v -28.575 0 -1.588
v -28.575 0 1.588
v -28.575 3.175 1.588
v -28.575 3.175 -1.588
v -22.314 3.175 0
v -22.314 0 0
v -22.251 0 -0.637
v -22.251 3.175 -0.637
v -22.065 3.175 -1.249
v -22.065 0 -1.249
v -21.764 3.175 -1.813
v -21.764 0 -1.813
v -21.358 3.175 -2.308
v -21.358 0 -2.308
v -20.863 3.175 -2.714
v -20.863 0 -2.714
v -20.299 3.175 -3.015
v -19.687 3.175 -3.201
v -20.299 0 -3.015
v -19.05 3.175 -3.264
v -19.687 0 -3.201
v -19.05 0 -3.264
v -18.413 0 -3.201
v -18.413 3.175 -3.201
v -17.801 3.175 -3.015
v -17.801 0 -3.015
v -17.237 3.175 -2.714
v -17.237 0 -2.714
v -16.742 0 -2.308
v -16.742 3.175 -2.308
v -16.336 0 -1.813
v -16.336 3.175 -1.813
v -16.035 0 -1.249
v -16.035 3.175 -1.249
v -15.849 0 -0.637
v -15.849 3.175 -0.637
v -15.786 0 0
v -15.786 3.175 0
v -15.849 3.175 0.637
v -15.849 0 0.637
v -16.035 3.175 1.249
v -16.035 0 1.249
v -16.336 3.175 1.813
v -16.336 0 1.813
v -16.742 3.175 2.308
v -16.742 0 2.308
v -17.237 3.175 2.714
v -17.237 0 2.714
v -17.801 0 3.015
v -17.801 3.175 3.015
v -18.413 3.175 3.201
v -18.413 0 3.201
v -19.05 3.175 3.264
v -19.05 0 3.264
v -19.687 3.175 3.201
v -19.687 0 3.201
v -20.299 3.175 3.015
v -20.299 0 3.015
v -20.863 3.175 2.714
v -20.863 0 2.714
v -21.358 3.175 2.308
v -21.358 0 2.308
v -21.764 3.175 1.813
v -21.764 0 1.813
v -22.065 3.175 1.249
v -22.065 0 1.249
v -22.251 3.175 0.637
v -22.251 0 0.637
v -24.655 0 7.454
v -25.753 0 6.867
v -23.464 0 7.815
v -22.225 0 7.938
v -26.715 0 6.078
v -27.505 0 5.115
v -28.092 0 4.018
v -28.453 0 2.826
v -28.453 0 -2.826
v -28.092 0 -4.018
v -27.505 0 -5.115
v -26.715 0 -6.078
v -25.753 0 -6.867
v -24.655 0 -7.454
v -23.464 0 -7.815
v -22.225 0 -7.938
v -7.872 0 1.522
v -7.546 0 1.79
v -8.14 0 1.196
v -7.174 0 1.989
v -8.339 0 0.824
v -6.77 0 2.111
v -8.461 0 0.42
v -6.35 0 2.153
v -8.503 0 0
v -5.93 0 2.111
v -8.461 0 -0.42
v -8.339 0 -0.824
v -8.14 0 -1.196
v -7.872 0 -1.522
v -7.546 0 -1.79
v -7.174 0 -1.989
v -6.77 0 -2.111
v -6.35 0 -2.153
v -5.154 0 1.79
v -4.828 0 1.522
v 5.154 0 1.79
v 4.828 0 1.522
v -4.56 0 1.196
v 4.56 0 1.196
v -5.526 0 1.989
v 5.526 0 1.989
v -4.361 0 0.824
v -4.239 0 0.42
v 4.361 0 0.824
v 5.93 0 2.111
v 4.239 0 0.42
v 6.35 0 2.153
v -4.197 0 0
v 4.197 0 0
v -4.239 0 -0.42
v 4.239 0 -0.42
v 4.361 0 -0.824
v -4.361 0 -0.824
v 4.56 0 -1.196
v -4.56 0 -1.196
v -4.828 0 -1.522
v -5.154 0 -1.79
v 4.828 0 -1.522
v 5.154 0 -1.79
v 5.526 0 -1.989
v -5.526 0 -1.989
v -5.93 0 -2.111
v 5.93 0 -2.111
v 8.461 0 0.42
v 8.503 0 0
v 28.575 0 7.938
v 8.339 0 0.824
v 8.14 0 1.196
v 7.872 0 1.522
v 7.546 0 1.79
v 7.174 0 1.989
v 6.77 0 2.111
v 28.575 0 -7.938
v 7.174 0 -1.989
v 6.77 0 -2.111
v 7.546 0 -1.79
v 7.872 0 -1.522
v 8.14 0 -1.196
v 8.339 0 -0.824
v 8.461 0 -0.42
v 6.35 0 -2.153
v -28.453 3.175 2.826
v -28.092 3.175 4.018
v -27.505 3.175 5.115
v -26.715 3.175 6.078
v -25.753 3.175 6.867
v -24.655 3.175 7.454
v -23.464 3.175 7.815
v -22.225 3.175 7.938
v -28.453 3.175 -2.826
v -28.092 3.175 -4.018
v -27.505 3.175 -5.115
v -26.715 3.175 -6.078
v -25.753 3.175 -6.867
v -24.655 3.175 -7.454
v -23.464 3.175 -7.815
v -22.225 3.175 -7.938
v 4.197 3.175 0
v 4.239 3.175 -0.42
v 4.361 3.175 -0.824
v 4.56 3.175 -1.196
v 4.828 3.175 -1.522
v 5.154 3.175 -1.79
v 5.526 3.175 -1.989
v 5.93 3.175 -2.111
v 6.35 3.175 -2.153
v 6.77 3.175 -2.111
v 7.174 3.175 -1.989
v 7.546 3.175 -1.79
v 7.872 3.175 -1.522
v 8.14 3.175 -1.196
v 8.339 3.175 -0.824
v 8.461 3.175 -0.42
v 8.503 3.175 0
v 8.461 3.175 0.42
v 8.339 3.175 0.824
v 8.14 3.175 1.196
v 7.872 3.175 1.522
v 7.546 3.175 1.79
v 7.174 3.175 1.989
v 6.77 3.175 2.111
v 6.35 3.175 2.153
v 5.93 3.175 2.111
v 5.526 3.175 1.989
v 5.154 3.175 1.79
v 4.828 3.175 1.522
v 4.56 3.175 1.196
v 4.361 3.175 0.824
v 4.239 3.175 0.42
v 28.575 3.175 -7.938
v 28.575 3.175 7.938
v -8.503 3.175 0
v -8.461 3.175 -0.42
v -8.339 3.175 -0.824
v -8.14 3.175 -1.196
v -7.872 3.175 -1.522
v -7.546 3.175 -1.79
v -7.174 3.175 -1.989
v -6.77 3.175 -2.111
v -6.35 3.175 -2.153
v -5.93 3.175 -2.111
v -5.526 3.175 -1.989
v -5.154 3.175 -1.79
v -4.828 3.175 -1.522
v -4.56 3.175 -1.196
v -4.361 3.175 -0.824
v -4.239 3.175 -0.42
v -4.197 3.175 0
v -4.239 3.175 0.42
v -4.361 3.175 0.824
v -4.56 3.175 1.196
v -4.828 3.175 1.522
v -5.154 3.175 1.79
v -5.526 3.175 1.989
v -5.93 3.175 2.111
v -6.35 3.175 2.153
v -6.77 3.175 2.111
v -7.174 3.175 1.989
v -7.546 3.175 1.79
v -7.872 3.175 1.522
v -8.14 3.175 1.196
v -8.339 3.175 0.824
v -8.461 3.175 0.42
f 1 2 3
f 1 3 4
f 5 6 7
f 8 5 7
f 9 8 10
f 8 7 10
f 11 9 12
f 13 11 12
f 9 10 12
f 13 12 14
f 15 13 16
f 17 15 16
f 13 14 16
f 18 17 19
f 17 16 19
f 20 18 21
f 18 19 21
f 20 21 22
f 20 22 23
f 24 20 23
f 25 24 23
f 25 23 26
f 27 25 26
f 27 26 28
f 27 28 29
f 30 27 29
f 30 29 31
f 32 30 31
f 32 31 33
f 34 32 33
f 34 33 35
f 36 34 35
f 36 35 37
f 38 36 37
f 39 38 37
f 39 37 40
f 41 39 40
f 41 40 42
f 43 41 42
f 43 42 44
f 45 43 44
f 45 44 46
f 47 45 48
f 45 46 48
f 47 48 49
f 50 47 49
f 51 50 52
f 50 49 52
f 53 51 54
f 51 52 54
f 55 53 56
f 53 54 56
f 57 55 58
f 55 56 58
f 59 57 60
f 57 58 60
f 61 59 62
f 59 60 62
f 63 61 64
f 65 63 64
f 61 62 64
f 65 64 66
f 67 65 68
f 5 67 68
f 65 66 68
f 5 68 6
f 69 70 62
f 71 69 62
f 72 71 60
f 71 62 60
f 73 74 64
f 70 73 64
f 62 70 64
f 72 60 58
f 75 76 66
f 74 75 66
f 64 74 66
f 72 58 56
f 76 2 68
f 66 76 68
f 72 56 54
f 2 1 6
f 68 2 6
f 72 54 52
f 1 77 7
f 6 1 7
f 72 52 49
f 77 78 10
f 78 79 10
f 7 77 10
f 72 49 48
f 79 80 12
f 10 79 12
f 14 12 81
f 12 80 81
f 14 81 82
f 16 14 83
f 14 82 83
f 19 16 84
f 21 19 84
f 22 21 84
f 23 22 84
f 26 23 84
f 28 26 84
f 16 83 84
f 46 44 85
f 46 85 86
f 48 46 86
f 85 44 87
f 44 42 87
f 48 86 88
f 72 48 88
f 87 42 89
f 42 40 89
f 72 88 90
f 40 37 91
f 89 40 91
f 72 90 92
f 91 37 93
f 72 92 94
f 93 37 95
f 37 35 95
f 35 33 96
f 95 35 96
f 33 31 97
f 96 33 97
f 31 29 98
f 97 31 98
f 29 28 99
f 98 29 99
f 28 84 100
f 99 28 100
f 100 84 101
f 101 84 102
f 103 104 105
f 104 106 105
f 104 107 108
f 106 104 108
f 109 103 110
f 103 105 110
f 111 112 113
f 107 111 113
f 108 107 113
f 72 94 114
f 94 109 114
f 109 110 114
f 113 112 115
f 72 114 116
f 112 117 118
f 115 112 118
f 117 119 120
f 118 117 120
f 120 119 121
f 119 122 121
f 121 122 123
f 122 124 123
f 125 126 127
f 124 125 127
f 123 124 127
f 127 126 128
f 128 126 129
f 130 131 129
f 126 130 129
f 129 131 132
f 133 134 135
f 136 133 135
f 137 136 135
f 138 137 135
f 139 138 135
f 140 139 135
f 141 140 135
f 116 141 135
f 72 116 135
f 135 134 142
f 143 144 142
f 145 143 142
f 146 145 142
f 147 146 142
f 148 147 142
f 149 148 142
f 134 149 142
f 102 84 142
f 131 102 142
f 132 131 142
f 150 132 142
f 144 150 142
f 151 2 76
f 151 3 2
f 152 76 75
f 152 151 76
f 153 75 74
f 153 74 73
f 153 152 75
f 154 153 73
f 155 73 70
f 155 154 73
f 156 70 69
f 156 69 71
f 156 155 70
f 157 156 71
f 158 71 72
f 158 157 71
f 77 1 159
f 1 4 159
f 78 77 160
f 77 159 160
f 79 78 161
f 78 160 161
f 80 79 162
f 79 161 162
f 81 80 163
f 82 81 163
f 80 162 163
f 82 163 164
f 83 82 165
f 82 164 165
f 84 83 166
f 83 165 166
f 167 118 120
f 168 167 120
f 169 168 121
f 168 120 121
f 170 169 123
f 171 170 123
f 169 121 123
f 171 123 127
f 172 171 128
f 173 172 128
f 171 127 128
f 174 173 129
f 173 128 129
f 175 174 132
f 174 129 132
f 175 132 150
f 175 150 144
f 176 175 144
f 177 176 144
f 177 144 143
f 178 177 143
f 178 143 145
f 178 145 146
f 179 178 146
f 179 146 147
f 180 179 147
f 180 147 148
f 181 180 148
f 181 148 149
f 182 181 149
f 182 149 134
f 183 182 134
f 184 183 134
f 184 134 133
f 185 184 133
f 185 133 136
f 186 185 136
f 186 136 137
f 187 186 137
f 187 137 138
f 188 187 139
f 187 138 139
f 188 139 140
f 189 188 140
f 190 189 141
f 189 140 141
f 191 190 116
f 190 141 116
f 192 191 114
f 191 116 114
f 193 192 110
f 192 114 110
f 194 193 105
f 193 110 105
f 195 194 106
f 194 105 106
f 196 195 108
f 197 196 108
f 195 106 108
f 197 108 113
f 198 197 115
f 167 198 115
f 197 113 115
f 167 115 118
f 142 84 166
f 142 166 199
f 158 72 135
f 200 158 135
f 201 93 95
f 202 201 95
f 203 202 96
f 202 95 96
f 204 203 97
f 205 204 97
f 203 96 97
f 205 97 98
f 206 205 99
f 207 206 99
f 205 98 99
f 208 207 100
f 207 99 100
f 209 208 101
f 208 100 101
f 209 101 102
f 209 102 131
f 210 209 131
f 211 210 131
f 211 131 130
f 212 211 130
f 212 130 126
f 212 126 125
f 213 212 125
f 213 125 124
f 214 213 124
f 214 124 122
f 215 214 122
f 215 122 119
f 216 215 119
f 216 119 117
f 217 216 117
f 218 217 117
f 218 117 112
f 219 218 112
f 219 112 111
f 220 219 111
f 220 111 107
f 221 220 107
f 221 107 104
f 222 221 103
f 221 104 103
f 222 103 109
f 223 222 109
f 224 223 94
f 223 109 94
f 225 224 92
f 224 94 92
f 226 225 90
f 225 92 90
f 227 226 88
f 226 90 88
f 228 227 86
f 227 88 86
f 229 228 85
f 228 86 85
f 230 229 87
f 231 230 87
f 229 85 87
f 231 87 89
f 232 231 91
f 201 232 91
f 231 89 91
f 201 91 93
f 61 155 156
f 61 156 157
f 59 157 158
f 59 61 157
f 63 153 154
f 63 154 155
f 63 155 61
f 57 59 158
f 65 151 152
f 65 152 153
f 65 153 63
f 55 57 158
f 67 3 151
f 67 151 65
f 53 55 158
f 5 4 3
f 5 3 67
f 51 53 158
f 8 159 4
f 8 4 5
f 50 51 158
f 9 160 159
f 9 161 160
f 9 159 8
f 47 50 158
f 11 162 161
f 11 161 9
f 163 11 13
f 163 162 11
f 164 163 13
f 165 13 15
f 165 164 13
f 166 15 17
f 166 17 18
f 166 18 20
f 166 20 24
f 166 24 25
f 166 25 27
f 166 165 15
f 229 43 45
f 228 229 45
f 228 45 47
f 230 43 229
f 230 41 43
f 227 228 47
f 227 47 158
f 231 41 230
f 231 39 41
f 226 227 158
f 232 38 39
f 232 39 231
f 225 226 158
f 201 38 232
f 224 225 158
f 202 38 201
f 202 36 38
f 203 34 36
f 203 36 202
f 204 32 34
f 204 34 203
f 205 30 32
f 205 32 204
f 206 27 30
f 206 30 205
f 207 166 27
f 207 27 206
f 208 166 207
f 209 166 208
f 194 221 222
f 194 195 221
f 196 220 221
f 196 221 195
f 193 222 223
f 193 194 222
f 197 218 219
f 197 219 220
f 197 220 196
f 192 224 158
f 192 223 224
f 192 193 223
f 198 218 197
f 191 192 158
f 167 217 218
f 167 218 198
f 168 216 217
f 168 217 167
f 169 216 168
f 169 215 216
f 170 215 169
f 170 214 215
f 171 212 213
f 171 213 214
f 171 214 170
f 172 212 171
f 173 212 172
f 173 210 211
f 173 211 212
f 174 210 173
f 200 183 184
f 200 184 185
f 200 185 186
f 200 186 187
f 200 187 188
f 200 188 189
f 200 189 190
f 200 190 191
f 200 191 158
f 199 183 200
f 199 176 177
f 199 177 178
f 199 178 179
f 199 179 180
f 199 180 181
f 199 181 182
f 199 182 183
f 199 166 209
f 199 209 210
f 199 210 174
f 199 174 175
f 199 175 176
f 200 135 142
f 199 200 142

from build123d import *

# Parameters (mm, degrees)
SKETCH1_W                    = 57.15
SKETCH1_H                    = 15.875
BOSS_EXTRUDE1_DEPTH          = 3.175
F_0_257_DIAMETER_HOLE1_D     = 6.5278
FILLET1_R                    = 6.35
F_18_0_1695_DIAMETER_HOLE1_D = 4.3053


with BuildPart() as part:
    # Sketch1 → Boss-Extrude1 (new body)
    with BuildSketch(Plane(origin=(0, 0, 0), x_dir=(1, 0, 0), z_dir=(0, 1, 0))):
        Rectangle(SKETCH1_W, SKETCH1_H)
    extrude(amount=BOSS_EXTRUDE1_DEPTH)

    # F (0.257) Diameter Hole1 (through all)
    with Locations(Plane(origin=(0, 3.175, 0), x_dir=(1, 0, 0), z_dir=(0, 1, 0))):
        with Locations((-19.05, 0)):
            Hole(F_0_257_DIAMETER_HOLE1_D / 2)

    # Fillet1
    fillet1_edges = [part.edges().sort_by_distance(p)[0] for p in [
        (-28.575, 1.5875, 7.9375),
        (-28.575, 1.5875, -7.9375),
    ]]
    fillet(fillet1_edges, radius=FILLET1_R)

    # #18 (0.1695) Diameter Hole1 (through all)
    with Locations(Plane(origin=(0, 3.175, 0), x_dir=(1, 0, 0), z_dir=(0, 1, 0))):
        with Locations((-6.35, 0), (6.35, 0)):
            Hole(F_18_0_1695_DIAMETER_HOLE1_D / 2)


solid = part.part
